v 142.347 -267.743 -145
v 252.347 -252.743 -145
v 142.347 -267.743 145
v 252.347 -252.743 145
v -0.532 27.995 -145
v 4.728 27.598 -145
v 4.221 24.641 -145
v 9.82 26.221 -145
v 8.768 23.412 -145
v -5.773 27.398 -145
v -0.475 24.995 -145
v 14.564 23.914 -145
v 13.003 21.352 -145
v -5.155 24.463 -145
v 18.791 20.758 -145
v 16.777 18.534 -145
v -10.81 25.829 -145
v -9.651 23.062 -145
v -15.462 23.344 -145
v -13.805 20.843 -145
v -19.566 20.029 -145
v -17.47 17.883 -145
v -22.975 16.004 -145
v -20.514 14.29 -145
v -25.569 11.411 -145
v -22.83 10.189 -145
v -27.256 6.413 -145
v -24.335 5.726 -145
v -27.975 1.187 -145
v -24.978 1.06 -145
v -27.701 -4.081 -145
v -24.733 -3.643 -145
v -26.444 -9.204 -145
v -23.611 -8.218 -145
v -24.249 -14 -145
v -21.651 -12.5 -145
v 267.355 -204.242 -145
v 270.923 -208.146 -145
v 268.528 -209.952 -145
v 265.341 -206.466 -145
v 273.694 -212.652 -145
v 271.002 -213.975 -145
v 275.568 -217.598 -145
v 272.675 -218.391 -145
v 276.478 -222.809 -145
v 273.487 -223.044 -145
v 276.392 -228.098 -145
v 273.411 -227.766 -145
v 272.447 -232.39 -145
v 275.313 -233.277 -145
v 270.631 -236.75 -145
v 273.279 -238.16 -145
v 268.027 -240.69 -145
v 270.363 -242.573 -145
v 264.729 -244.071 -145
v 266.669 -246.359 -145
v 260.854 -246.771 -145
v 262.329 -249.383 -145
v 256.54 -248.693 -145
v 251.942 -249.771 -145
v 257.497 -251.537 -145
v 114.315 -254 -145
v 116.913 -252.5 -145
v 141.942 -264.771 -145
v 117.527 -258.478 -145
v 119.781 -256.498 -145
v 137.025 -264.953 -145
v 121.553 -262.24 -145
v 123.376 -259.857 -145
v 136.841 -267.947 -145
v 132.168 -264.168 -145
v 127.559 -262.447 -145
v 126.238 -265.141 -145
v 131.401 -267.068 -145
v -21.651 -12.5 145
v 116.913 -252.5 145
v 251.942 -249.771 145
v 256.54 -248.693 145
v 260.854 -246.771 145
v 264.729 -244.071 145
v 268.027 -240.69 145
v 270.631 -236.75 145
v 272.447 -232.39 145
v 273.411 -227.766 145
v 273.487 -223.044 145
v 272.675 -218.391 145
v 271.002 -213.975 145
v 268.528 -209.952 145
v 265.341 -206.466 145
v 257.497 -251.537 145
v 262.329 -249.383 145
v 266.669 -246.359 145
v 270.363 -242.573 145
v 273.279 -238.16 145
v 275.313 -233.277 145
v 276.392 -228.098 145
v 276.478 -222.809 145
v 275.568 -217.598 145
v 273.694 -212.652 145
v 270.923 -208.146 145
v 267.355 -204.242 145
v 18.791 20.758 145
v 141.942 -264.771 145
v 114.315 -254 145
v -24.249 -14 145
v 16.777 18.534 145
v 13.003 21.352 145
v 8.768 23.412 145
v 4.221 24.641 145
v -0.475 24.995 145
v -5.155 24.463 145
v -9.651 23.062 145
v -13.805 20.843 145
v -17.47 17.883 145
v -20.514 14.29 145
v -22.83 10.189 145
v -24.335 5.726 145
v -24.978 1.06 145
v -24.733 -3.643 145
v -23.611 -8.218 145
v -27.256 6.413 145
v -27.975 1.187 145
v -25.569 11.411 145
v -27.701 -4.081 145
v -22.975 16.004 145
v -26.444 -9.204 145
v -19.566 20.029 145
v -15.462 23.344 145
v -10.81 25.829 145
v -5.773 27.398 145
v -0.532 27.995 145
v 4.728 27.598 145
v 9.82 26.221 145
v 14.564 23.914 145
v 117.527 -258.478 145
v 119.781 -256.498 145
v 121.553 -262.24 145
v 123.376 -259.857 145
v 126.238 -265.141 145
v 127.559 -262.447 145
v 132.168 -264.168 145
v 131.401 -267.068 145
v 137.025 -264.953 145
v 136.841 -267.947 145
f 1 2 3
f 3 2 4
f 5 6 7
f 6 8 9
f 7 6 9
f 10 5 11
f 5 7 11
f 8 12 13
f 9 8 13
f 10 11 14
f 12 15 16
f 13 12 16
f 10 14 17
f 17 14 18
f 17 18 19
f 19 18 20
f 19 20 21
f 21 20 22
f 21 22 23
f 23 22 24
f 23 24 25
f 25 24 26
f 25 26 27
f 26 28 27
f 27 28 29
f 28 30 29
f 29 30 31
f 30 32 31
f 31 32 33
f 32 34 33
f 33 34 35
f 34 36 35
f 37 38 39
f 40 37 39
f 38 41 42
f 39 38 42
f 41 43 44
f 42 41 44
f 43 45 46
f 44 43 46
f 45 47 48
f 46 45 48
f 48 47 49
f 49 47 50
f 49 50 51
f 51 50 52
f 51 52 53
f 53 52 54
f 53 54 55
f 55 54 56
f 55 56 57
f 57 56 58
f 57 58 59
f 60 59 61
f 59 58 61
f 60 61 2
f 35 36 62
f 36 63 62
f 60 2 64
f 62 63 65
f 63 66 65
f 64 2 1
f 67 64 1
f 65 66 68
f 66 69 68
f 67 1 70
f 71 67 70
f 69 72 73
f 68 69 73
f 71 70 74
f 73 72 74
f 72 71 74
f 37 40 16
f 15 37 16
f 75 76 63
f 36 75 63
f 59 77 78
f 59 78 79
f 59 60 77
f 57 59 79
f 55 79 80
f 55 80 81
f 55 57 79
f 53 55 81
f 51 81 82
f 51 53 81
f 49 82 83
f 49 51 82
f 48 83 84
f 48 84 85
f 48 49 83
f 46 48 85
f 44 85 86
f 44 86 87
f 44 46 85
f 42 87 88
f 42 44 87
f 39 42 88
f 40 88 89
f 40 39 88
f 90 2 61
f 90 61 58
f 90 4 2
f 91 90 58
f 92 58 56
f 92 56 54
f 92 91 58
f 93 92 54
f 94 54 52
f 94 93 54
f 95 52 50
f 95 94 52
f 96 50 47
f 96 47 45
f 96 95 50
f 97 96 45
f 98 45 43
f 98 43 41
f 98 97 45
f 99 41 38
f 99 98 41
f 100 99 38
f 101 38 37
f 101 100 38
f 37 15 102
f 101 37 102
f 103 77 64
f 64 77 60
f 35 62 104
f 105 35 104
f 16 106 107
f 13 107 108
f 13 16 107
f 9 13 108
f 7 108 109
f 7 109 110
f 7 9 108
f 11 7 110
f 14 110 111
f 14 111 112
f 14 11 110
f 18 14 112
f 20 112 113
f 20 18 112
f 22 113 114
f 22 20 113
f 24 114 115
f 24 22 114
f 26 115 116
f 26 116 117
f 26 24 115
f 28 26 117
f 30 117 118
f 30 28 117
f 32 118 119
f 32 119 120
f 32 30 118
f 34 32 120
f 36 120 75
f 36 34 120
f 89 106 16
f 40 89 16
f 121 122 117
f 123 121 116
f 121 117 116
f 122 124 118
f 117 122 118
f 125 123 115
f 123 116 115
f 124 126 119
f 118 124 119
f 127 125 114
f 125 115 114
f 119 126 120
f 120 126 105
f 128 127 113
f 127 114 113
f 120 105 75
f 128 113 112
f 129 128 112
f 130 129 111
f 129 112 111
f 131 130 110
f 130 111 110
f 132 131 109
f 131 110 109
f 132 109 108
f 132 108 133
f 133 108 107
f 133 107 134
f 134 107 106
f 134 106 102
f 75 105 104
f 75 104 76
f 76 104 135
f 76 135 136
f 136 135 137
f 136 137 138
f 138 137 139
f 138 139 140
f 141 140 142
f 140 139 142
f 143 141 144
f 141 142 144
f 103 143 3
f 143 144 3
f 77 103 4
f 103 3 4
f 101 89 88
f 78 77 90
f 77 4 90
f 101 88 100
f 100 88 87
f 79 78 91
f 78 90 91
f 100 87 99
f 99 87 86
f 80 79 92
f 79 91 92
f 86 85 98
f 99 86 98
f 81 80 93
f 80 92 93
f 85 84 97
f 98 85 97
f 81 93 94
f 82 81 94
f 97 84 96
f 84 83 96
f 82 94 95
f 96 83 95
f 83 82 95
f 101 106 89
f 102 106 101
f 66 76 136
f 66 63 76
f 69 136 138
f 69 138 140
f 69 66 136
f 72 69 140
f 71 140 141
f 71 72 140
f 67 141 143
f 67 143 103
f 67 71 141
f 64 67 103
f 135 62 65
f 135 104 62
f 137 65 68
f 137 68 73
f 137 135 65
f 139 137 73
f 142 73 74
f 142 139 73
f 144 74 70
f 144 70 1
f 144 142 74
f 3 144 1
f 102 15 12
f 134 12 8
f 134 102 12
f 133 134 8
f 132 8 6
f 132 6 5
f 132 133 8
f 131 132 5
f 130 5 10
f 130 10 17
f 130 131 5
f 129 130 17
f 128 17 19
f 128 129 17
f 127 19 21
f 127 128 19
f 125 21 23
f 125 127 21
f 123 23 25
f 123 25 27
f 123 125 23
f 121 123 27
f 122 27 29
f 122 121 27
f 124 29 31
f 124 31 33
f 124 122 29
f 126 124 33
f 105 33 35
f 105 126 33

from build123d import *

# Parameters (mm, degrees)
ESQUISSE3_W = 290
ESQUISSE3_H = 3


with BuildPart() as part:
    # Balayage1: sweep along a path in Esquisse2
    with BuildLine(Plane.XY) as balayage1_path:
        Line((-21.650635095, -12.5), (116.913429511, -252.5))
        ThreePointArc((116.913429511, -252.5), (127.558761221, -262.447344997), (141.941894724, -264.770754201))
        Line((141.941894724, -264.770754201), (251.941894724, -249.770754201))
        ThreePointArc((251.941894724, -249.770754201), (272.446913518, -232.389825968), (265.341354263, -206.465638621))
        Line((265.341354263, -206.465638621), (16.777289658, 18.534361379))
        ThreePointArc((16.777289658, 18.534361379), (-15.707331743, 19.449414631), (-21.650635095, -12.5))
    # Esquisse3 → Balayage1 (sweep)
    with BuildSketch(Plane(origin=(0, 0, 0), x_dir=(0, 0, -1), z_dir=(1, 0, 0))):
        with Locations((0, 26.5)):
            Rectangle(ESQUISSE3_W, ESQUISSE3_H)
    sweep(path=balayage1_path.line)


solid = part.part
